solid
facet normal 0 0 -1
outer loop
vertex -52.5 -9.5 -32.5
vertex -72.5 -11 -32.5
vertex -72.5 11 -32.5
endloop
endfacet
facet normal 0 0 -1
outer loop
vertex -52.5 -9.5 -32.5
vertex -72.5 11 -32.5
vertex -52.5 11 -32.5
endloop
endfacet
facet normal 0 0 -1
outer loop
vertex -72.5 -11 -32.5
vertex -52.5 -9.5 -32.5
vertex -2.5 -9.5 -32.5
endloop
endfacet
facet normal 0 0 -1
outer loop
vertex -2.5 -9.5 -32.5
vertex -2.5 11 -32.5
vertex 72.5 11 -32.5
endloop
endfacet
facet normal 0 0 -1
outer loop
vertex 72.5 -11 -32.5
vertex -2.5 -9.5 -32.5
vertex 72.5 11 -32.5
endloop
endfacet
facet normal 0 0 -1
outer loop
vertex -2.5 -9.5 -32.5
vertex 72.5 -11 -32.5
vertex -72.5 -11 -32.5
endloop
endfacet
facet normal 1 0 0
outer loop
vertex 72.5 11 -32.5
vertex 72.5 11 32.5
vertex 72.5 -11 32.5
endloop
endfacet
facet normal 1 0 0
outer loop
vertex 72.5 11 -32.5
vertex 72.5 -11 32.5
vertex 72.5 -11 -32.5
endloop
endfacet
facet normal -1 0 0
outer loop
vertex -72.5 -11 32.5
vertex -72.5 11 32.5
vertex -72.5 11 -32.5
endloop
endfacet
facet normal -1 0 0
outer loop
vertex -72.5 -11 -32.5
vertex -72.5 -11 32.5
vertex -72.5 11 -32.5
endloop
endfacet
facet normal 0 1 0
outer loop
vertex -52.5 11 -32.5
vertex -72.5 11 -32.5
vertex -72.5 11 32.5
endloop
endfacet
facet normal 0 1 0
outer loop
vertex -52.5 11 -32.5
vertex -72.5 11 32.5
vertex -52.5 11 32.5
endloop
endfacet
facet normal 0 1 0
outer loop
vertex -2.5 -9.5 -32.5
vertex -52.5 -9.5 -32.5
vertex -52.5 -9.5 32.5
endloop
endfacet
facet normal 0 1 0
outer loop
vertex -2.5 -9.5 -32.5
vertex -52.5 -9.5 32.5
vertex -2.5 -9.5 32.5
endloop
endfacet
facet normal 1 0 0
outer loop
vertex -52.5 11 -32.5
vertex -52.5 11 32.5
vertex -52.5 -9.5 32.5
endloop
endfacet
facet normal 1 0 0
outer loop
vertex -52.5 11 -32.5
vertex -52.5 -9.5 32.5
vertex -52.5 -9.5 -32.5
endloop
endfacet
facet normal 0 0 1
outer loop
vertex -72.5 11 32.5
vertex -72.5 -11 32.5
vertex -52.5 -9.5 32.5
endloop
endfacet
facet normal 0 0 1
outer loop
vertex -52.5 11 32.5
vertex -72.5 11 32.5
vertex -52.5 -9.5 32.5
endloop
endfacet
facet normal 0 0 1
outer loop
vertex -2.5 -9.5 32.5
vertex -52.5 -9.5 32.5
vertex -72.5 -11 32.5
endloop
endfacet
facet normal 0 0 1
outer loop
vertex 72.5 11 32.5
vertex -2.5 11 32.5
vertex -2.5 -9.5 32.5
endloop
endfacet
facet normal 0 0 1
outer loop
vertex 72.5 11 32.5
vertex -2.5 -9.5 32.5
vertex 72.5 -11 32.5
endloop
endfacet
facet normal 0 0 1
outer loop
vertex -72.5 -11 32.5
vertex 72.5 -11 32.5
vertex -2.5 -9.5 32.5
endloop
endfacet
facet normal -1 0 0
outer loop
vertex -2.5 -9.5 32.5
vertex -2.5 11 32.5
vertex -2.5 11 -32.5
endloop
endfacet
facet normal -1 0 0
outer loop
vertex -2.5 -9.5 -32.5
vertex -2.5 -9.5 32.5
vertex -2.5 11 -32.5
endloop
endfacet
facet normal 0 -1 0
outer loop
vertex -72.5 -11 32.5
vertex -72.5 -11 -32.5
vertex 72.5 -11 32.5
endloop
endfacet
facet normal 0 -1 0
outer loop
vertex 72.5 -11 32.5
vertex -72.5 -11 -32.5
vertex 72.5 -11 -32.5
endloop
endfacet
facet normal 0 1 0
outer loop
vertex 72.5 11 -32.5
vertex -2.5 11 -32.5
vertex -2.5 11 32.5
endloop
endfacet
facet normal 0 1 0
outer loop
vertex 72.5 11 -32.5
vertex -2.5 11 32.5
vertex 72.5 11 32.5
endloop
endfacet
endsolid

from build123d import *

# Parameters (mm, degrees)
SKETCH1_W           = 145
SKETCH1_H           = 65
BOSS_EXTRUDE1_DEPTH = 11
SKETCH2_W           = 50
SKETCH2_H           = 65
CUT_EXTRUDE1_DEPTH  = 20.5


with BuildPart() as part:
    # Sketch1 → Boss-Extrude1 (new body, symmetric)
    with BuildSketch(Plane(origin=(0, 0, 0), x_dir=(1, 0, 0), z_dir=(0, 1, 0))):
        Rectangle(SKETCH1_W, SKETCH1_H)
    extrude(amount=BOSS_EXTRUDE1_DEPTH, both=True)

    # Sketch2 → Cut-Extrude1 (cut)
    with BuildSketch(Plane(origin=(0, 11, 0), x_dir=(1, 0, 0), z_dir=(0, 1, 0))):
        with Locations((-27.5, 0)):
            Rectangle(SKETCH2_W, SKETCH2_H)
    extrude(amount=-CUT_EXTRUDE1_DEPTH, mode=Mode.SUBTRACT)


solid = part.part
